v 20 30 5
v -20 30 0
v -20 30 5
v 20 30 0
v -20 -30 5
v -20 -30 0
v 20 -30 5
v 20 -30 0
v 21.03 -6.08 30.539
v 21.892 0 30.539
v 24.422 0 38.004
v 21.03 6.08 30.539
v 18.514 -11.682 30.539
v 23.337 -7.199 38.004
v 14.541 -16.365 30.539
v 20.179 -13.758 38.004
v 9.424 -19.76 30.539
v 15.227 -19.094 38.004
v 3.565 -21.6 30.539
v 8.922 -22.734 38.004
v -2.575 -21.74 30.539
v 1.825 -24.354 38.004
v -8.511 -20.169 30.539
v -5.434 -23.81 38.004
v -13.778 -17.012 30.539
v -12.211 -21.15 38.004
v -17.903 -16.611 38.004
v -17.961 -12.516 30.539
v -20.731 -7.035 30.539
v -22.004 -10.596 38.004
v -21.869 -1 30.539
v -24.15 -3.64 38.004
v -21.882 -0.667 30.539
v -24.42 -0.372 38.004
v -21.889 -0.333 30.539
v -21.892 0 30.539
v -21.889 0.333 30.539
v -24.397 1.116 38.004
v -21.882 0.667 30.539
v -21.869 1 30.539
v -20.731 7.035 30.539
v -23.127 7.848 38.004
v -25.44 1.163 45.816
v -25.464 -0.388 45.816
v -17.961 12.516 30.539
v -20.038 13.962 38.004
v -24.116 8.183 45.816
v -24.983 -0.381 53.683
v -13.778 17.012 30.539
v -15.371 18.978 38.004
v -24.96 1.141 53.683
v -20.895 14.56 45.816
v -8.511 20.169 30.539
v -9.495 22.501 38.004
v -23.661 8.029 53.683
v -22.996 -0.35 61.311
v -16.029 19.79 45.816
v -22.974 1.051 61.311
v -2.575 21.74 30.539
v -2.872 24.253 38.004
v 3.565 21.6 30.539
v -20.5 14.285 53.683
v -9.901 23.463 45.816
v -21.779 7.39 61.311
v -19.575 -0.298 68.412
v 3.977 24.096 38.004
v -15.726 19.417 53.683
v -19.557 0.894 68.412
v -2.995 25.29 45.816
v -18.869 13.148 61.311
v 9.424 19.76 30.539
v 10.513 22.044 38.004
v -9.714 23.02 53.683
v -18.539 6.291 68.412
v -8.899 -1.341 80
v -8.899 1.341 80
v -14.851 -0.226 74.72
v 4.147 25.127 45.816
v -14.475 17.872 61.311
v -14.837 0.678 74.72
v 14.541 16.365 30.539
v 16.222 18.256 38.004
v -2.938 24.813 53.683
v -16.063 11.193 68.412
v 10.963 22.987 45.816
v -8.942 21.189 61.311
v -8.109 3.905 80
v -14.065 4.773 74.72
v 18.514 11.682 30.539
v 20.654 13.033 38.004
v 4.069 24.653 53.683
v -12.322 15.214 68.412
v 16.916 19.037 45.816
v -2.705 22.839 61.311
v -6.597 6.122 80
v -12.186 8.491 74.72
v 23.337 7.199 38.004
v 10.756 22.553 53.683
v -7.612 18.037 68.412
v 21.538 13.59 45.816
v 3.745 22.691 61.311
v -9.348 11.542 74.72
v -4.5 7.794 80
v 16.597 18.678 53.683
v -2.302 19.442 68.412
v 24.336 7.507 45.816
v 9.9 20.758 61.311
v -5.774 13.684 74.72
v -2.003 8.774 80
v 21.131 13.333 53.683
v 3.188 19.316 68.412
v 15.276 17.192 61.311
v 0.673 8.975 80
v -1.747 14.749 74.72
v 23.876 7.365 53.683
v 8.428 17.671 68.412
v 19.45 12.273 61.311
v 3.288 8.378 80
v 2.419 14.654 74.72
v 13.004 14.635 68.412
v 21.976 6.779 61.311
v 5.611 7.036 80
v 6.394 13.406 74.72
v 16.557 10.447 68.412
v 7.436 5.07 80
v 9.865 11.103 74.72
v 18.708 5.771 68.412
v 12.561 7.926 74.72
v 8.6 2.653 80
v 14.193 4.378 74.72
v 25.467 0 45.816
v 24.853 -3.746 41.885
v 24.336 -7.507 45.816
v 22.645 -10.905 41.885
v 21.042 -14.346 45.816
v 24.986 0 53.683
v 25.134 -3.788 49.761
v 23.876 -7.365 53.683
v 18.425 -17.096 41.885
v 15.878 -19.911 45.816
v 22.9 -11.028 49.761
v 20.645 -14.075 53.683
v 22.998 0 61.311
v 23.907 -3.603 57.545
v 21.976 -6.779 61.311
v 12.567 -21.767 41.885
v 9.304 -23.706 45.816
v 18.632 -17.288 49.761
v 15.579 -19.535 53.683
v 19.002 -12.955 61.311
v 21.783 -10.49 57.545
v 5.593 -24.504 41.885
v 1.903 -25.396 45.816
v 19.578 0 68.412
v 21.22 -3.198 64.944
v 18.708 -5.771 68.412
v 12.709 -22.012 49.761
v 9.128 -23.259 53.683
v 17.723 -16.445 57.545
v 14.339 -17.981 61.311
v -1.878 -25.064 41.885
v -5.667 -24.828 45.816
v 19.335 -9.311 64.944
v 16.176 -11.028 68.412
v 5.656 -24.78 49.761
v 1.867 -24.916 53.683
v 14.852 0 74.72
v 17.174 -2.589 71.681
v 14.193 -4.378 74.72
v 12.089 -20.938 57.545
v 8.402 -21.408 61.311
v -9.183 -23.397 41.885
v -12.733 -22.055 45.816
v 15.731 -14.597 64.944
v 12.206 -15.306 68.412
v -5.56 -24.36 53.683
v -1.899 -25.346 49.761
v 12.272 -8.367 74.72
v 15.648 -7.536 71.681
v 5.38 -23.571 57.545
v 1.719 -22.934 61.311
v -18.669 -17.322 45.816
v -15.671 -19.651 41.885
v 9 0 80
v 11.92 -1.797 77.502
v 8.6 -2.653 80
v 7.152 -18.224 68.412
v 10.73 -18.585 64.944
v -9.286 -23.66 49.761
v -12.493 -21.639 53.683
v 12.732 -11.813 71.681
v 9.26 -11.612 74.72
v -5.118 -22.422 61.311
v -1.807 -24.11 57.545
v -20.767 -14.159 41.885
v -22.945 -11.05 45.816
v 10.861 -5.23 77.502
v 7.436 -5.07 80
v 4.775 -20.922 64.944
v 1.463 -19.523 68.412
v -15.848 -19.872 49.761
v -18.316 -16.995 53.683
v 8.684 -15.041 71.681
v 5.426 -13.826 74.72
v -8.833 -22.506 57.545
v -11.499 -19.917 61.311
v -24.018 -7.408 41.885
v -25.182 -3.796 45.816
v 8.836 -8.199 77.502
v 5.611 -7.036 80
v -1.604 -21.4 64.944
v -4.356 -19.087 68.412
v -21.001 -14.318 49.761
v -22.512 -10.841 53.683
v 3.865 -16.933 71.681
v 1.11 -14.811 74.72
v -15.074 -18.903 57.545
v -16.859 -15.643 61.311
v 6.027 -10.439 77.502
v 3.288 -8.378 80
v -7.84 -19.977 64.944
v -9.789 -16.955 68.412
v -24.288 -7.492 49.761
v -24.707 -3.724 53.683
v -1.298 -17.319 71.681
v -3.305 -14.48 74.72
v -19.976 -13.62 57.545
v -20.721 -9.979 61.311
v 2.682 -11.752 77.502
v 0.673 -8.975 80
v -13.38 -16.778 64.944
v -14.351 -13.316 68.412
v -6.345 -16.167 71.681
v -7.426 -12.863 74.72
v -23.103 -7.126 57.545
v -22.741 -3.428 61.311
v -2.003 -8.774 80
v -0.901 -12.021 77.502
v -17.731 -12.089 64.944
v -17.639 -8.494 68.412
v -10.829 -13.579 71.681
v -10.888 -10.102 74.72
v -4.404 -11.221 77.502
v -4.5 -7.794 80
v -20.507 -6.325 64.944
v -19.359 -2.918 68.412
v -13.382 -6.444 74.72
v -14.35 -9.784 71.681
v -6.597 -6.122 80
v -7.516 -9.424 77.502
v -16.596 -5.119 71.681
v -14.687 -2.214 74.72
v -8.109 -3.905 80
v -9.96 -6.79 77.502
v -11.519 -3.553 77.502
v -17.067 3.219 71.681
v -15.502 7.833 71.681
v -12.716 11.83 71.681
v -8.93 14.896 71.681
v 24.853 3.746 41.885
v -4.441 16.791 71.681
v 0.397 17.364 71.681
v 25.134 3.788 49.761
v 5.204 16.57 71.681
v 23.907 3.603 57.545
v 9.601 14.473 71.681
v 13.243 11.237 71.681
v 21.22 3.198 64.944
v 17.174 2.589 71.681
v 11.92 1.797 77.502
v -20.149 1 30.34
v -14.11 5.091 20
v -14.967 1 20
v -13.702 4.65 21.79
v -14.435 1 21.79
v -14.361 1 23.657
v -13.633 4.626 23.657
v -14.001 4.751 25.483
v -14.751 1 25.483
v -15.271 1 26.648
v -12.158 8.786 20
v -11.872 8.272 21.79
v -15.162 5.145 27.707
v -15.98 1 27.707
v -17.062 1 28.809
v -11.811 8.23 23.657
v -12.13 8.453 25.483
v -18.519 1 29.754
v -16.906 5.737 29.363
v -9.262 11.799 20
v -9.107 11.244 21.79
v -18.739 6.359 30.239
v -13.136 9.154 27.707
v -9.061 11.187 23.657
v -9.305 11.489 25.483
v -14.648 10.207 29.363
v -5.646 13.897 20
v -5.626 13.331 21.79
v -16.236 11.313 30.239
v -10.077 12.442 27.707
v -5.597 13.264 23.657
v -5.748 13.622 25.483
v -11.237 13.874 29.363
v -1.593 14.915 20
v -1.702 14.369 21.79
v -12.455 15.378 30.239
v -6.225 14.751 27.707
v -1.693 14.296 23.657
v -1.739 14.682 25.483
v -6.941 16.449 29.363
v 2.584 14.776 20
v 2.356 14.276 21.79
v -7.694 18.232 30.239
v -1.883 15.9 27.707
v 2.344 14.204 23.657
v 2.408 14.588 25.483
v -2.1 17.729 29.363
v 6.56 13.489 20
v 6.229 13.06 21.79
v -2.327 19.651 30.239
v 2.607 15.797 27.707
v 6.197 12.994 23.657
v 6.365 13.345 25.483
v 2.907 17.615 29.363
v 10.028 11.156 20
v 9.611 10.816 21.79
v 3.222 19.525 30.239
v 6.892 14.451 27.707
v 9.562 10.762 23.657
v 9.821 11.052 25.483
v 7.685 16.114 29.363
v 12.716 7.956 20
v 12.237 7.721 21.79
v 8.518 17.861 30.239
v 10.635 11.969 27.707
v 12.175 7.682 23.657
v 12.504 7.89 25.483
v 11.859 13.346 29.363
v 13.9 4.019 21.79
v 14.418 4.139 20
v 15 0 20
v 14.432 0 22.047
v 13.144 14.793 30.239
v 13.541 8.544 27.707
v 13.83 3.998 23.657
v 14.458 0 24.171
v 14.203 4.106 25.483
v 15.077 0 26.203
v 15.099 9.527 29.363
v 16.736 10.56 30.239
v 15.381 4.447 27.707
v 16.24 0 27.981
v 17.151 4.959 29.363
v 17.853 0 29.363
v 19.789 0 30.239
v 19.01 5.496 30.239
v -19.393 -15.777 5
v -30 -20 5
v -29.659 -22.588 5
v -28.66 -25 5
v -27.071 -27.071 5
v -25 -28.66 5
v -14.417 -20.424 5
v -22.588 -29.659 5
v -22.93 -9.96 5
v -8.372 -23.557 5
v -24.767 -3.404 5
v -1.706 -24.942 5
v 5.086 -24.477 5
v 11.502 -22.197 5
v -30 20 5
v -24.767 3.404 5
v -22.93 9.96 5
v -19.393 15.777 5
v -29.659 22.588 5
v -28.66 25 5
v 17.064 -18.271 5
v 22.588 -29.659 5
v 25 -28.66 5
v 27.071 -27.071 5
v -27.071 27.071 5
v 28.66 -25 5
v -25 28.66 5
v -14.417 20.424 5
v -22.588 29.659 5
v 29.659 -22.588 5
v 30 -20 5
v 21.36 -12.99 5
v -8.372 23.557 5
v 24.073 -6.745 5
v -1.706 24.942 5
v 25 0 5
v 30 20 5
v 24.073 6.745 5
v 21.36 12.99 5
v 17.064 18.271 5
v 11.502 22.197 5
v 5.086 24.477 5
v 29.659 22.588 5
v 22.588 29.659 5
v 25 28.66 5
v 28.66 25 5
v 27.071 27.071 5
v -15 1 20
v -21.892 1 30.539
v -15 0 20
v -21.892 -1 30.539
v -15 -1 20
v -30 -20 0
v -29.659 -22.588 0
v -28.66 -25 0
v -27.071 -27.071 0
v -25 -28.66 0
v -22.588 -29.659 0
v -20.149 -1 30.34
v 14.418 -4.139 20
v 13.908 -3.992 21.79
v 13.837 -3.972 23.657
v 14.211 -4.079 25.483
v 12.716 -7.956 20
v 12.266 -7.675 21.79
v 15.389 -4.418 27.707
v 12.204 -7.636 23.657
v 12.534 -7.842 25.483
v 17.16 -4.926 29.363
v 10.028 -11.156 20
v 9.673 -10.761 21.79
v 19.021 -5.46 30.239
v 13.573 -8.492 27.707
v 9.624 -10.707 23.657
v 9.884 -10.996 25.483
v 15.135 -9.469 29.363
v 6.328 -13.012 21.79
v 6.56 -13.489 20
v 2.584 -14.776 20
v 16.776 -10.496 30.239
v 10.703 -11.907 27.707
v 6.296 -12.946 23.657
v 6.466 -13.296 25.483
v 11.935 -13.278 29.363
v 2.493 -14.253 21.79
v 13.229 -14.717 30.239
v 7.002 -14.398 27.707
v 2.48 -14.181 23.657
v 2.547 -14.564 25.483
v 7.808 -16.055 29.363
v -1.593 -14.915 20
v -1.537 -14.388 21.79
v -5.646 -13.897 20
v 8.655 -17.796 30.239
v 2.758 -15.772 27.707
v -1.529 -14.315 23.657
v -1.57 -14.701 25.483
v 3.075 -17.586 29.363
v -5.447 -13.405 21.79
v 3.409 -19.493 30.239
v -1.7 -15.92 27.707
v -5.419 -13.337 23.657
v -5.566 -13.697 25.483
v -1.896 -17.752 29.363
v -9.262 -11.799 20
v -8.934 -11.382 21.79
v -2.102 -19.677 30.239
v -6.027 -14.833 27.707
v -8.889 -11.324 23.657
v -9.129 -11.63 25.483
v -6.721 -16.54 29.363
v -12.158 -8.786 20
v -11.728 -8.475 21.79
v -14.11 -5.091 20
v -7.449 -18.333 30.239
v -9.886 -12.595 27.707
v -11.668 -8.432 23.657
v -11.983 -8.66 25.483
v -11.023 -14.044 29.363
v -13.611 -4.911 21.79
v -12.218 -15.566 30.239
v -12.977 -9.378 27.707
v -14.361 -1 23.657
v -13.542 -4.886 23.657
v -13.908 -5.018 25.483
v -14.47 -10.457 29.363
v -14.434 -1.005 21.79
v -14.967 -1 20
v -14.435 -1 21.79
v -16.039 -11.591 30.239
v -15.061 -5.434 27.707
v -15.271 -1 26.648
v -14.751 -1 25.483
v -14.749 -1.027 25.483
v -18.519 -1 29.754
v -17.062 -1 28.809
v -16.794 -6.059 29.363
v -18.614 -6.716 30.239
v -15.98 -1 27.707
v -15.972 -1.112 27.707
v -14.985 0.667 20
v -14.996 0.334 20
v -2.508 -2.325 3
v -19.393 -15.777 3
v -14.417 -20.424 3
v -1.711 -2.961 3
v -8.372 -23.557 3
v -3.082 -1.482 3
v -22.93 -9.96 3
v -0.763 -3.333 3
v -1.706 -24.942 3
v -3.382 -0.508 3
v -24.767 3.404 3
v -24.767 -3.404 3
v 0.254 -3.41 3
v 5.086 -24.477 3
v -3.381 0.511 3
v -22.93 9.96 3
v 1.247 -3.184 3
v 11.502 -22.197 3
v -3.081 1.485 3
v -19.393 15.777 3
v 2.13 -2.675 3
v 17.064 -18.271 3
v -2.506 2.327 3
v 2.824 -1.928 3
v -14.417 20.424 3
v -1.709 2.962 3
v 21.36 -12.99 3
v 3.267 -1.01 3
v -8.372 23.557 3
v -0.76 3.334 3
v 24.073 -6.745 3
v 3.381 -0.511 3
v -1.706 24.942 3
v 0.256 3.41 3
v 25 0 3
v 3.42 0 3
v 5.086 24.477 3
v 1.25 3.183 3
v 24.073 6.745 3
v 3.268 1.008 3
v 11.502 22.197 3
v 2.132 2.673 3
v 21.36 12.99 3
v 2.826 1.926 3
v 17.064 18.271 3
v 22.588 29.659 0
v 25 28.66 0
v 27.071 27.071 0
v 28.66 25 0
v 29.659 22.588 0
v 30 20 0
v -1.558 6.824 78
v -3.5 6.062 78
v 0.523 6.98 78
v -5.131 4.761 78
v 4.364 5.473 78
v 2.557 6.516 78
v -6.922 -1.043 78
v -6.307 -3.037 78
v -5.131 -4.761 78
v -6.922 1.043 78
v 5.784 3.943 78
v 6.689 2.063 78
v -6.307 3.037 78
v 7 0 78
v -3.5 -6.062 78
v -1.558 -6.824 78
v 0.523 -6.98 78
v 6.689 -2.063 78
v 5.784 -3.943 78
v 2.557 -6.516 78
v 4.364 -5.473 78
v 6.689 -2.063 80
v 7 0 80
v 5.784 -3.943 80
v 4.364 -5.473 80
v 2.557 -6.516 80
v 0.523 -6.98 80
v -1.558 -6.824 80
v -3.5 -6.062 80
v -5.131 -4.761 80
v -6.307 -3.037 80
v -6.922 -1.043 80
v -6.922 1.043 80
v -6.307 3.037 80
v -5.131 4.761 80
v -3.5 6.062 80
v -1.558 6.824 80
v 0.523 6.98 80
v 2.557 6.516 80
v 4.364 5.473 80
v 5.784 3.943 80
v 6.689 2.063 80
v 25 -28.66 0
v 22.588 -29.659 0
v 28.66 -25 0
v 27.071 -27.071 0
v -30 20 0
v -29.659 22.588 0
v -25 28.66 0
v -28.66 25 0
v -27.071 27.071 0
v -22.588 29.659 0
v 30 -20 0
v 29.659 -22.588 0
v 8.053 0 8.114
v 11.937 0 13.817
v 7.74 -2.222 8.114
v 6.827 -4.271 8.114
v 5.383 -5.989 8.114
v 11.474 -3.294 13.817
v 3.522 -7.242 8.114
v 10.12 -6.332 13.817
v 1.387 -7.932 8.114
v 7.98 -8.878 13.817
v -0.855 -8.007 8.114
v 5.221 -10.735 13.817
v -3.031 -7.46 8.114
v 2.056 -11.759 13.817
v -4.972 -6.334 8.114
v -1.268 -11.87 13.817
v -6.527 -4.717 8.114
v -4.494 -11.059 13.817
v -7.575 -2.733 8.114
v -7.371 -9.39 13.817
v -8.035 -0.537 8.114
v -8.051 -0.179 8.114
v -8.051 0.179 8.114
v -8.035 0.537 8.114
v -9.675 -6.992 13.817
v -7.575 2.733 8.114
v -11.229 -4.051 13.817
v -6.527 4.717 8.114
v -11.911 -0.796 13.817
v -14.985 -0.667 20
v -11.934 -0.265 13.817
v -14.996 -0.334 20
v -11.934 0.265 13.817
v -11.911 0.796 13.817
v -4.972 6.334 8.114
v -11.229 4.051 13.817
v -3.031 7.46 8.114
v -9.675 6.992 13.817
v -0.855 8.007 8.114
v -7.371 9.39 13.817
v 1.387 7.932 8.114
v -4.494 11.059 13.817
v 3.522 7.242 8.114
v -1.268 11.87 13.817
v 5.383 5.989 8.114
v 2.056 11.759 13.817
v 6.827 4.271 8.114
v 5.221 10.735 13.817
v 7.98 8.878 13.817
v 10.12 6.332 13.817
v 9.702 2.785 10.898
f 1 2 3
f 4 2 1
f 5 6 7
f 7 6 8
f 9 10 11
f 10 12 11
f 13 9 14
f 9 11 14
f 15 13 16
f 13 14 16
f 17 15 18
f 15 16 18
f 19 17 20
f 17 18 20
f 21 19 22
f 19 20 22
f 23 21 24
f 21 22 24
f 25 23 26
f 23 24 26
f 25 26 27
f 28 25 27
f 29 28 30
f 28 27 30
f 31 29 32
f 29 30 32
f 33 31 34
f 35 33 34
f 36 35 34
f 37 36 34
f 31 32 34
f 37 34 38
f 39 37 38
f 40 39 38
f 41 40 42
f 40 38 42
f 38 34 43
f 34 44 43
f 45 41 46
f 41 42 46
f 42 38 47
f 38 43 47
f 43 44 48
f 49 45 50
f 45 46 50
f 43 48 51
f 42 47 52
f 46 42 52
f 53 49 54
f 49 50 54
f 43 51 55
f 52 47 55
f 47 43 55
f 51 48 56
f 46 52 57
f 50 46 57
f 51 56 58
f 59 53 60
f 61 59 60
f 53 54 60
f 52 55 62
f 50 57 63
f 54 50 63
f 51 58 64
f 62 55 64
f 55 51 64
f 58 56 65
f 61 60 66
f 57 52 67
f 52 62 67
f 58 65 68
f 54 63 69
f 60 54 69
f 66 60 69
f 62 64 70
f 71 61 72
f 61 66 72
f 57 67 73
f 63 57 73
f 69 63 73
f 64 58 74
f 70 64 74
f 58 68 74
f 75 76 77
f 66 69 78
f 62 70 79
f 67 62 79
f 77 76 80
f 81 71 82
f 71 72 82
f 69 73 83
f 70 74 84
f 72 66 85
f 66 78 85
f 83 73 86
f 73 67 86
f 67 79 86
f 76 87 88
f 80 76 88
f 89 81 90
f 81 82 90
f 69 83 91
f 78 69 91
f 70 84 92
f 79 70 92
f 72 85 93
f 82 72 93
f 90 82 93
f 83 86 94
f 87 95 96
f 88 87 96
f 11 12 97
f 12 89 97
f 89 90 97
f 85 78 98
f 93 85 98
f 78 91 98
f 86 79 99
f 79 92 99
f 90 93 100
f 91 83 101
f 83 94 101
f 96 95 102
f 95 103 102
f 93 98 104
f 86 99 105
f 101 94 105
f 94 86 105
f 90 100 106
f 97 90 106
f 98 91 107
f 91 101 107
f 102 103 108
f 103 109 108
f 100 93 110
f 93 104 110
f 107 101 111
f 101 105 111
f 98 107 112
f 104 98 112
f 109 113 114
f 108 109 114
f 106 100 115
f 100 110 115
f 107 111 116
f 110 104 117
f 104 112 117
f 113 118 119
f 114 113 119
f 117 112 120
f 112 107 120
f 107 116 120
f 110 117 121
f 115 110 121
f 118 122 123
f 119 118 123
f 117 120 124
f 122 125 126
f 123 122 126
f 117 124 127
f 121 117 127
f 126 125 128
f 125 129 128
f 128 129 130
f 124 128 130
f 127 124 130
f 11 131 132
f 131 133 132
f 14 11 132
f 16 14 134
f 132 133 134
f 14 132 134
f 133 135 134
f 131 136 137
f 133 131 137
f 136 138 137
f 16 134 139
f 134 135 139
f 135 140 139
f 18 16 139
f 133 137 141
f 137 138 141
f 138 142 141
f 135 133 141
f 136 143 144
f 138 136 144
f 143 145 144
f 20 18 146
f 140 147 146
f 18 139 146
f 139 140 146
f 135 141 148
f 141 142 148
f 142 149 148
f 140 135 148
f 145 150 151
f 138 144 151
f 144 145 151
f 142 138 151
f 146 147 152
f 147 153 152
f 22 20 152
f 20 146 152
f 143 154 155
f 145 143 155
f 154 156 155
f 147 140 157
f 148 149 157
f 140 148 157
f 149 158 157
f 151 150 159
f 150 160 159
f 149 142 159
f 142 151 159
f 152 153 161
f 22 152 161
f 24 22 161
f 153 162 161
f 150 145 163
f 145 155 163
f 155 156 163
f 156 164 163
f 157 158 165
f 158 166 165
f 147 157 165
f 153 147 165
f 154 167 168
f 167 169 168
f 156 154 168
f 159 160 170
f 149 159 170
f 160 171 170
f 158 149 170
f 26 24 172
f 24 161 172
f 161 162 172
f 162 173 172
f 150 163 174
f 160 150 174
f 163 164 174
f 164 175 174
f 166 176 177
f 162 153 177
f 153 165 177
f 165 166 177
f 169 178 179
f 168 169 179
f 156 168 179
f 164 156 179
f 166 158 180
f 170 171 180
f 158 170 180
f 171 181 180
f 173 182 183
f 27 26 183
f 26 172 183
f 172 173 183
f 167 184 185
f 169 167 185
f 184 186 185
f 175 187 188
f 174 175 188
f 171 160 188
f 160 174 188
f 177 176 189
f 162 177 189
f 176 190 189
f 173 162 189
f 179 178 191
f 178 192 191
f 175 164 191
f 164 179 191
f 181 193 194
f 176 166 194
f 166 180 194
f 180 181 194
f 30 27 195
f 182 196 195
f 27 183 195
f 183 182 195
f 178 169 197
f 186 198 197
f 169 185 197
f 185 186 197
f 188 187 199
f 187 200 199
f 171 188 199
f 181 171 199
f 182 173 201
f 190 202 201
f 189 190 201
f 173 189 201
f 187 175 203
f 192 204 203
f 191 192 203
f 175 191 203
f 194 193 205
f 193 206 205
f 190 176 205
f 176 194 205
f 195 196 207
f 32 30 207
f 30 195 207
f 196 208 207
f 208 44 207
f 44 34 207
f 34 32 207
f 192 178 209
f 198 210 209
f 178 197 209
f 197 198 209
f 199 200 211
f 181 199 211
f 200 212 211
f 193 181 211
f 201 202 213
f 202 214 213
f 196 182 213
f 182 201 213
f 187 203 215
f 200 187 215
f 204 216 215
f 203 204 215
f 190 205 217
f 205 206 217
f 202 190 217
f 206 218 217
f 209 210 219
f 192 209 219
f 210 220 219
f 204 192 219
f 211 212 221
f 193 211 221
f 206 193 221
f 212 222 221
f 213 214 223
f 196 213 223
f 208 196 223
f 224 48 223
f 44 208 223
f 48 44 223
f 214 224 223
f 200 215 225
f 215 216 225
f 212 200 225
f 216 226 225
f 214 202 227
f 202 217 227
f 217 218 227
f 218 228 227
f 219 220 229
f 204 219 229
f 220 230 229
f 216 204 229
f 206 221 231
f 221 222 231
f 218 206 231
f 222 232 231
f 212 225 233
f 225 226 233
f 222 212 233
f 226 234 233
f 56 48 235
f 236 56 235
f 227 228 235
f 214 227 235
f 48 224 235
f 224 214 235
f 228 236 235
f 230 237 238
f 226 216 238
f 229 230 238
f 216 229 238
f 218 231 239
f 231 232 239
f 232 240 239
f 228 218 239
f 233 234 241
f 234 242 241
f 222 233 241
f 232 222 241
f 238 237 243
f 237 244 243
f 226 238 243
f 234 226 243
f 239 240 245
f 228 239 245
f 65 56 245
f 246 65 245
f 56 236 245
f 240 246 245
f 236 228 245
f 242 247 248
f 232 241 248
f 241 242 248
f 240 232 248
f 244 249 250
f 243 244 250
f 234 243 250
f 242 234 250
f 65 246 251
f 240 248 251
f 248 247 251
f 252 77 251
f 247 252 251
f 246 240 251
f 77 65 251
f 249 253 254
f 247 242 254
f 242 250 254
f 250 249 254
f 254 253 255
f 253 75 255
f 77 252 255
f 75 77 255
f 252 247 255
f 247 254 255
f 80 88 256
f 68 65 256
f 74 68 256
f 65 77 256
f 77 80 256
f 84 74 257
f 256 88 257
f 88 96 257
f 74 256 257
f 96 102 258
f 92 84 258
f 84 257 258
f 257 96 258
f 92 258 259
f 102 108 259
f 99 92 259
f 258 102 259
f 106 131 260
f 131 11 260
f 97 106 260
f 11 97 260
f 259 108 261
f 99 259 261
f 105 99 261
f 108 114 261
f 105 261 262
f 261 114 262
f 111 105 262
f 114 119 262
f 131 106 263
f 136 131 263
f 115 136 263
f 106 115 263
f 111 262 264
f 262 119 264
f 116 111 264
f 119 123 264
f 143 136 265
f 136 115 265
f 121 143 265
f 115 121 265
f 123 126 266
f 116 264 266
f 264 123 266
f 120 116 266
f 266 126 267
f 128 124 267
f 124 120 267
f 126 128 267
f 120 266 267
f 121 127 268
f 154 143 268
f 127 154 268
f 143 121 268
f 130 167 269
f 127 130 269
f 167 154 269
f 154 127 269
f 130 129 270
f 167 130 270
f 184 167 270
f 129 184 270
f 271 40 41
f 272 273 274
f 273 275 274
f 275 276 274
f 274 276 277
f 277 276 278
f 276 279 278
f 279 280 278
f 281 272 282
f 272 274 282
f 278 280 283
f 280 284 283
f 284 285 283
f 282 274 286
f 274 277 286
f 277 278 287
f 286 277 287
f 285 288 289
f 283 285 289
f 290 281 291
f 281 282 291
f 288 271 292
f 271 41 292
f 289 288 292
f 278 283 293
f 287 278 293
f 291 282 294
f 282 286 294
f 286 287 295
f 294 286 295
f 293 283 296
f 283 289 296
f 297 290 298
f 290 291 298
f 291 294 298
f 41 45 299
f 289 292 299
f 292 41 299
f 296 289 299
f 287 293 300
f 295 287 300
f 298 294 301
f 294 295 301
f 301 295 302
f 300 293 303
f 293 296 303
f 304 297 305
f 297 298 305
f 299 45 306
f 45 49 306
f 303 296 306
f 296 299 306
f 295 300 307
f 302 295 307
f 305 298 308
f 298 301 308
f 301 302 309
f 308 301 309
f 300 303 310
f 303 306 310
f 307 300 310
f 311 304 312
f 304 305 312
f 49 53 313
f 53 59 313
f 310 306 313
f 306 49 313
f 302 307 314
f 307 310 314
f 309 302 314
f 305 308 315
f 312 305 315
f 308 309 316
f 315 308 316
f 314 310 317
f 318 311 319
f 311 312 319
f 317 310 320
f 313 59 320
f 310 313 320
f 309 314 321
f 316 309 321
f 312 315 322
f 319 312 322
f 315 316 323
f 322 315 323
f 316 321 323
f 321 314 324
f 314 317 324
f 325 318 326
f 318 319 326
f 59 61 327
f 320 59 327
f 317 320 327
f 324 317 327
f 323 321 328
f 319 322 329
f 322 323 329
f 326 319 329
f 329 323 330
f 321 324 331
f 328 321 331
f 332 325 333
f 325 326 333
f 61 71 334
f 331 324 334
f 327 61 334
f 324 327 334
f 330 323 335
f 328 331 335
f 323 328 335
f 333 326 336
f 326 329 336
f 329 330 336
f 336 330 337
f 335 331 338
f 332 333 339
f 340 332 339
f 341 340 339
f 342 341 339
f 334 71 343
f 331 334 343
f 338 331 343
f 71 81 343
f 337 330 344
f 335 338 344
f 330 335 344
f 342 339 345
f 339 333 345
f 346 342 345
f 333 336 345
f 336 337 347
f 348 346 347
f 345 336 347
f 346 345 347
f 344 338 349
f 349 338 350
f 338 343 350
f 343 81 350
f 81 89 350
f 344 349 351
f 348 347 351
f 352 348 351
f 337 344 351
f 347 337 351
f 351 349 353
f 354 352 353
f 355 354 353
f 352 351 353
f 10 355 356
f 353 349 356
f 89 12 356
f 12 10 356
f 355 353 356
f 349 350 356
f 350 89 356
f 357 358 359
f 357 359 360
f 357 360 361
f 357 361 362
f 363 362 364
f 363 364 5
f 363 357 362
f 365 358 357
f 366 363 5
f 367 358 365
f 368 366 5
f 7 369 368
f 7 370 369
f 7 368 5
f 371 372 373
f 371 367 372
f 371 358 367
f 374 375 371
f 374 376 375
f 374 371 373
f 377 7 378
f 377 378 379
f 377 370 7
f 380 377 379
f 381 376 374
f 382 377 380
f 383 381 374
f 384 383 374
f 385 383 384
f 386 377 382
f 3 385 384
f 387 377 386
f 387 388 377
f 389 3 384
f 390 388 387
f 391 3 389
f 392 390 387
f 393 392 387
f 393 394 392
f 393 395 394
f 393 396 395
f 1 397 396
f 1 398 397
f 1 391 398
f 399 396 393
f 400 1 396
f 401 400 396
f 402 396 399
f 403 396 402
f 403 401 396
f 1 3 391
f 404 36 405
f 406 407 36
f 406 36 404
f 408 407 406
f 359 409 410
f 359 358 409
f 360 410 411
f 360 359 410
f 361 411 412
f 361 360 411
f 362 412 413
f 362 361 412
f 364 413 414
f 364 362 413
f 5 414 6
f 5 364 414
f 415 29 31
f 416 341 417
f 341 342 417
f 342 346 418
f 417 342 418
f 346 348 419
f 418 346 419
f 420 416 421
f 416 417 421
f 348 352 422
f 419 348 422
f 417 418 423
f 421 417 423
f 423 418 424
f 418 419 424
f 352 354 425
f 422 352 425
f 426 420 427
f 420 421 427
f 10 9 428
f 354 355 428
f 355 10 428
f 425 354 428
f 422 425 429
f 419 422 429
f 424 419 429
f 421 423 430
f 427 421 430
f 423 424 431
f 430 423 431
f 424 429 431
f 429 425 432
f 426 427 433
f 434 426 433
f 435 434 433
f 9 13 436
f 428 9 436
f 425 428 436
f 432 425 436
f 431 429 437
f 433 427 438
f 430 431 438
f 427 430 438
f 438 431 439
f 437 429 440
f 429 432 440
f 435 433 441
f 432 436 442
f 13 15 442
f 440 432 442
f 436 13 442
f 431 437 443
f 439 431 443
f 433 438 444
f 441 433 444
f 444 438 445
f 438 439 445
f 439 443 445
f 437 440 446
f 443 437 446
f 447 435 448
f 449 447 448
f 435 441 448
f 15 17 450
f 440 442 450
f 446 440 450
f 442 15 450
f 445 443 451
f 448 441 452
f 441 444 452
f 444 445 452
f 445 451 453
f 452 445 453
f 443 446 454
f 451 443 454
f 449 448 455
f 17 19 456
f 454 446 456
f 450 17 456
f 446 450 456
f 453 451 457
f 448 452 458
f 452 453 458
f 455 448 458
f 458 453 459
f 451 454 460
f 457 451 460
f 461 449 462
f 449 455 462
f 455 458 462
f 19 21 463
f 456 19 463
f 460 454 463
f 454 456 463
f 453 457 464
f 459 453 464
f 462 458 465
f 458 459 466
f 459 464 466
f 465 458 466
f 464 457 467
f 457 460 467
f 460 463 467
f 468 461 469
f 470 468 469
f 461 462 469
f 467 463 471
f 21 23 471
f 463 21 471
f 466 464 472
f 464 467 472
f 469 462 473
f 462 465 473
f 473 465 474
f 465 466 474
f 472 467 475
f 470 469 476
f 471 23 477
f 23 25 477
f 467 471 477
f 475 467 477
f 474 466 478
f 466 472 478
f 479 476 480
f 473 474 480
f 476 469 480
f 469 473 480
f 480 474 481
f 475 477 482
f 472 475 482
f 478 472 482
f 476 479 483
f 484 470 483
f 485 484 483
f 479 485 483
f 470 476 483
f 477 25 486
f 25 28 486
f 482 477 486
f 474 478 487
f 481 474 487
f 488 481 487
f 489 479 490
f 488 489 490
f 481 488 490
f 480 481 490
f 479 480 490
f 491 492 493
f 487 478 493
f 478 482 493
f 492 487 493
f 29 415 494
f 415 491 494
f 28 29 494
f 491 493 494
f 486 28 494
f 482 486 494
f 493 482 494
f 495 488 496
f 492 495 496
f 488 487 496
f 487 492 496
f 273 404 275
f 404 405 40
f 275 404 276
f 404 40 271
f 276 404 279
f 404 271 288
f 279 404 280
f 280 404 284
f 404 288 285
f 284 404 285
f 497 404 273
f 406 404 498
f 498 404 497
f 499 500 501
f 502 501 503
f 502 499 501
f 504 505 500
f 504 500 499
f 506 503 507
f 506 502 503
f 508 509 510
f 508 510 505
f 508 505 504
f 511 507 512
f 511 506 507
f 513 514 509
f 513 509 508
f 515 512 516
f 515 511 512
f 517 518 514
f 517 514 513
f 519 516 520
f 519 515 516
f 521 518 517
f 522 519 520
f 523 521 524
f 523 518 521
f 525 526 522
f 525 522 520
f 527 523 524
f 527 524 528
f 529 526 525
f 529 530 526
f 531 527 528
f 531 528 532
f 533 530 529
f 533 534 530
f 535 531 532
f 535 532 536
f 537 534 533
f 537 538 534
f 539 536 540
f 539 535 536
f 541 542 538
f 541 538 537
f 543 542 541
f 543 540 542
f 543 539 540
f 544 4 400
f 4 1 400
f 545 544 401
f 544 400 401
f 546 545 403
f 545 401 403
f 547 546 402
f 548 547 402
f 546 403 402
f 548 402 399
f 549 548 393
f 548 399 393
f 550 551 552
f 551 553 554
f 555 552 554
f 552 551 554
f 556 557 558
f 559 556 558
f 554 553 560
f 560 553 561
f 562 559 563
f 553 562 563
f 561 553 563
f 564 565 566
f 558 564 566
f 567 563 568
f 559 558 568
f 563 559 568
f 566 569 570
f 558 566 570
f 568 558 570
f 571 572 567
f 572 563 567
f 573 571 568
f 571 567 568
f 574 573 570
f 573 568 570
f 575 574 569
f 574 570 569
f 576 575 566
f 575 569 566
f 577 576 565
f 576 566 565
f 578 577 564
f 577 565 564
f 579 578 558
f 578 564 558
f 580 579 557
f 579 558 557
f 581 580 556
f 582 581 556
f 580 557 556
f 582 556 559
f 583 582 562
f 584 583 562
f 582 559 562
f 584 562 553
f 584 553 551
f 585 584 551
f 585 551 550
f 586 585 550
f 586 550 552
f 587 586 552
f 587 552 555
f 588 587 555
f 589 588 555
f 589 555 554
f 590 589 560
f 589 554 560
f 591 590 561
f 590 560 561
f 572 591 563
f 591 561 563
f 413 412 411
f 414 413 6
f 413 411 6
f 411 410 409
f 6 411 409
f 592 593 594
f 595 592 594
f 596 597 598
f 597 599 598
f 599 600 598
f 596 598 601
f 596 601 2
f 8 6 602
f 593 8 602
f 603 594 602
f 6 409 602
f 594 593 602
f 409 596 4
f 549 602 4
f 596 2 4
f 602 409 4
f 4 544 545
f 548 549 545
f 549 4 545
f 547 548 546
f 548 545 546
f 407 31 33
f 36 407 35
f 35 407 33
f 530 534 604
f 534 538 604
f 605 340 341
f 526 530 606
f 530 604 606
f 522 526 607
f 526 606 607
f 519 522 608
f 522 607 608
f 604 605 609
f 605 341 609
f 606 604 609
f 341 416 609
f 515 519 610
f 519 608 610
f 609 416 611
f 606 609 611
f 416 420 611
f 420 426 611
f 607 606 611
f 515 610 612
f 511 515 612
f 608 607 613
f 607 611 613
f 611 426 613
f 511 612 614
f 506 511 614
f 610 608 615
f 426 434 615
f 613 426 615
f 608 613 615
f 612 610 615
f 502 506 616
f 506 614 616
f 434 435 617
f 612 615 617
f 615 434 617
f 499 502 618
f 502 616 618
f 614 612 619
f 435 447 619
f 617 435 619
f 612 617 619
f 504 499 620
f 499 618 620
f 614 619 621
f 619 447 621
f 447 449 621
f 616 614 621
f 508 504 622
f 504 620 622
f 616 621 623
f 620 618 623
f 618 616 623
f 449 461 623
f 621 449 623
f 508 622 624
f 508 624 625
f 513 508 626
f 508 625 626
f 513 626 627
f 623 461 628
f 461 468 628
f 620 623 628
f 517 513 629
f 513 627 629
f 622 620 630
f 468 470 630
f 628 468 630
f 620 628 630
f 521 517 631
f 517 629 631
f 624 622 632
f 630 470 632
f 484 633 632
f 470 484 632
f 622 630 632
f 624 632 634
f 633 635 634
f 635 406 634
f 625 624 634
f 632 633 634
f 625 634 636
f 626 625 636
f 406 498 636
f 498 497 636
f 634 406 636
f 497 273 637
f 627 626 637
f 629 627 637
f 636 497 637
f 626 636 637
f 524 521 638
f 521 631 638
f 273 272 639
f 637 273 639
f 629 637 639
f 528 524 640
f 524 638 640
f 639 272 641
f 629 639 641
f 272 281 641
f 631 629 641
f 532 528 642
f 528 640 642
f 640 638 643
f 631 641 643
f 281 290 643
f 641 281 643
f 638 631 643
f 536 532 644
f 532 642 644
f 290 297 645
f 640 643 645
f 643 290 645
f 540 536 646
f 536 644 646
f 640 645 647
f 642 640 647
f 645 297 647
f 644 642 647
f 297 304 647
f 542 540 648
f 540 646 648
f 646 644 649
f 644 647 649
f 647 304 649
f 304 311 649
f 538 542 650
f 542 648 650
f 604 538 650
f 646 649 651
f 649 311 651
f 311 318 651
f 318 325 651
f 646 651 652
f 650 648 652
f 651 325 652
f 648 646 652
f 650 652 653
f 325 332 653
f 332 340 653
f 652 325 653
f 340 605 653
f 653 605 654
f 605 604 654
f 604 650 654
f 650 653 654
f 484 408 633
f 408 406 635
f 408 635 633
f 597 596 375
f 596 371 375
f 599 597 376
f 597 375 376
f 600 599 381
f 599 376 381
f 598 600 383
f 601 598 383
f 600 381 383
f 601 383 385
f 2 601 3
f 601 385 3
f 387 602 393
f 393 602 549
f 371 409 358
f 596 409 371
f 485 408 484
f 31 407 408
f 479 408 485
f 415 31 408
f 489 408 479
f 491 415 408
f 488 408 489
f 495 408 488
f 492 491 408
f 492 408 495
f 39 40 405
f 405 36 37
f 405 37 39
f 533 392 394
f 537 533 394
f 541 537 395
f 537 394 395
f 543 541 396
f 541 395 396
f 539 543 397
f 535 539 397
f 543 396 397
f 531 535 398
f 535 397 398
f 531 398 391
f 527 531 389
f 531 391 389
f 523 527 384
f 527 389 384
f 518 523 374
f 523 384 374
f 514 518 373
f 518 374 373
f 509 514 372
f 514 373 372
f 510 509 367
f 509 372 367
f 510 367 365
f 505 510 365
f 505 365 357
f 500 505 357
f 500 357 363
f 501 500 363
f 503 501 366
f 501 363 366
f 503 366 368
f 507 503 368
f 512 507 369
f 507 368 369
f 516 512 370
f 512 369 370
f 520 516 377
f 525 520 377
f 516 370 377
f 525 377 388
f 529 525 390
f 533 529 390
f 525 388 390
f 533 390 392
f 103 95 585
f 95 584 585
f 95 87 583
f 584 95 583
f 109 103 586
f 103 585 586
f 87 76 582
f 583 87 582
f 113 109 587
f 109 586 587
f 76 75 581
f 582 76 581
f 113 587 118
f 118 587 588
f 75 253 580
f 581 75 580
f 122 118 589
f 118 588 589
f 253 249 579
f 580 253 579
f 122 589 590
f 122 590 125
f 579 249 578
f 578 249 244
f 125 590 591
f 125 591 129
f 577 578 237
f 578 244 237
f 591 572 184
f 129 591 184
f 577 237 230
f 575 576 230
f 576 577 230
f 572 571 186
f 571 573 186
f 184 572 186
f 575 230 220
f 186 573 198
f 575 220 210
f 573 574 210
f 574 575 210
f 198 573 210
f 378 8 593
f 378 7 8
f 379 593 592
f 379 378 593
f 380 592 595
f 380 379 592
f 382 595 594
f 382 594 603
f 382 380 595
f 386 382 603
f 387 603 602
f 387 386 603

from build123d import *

# Parameters (mm, degrees)
F0_W     = 60
F0_H     = 60
F1_DEPTH = 5
F2_R     = 25
F3_DEPTH = 2
F4_R     = 10
F8_DEPTH = 1


with BuildPart() as f1:
    # F0 (on Top) → F1 (new body)
    with BuildSketch(Plane.XY):
        Rectangle(F0_W, F0_H)
    extrude(amount=F1_DEPTH)

    # F2 (on face) → F3 (cut)
    with BuildSketch(Plane.XY.offset(5)):
        Circle(F2_R)
    extrude(amount=-F3_DEPTH, mode=Mode.SUBTRACT)

    # F4
    f4_edges = [f1.edges().sort_by_distance(p)[0] for p in [
        (30, 30, 2.5),
        (-30, 30, 2.5),
        (30, -30, 2.5),
        (-30, -30, 2.5),
    ]]
    fillet(f4_edges, radius=F4_R)

    # F5 (on Front) → F6 (revolve)
    with BuildSketch(Plane.XZ):
        with BuildLine():
            Line((15, 20), (0, 20))
            Line((0, 20), (0, 0))
            ThreePointArc((0, 0), (8.770167, 9.047375), (15, 20))
        make_face()
        with BuildLine():
            Line((21.891709, 30.538945), (0, 30.538945))
            Line((0, 30.538945), (0, 20))
            Line((0, 20), (15, 20))
            ThreePointArc((15, 20), (15.595579, 27.133347), (21.891709, 30.538945))
        make_face()
        with BuildLine():
            Line((7, 78), (0, 78))
            Line((0, 78), (0, 30.538945))
            Line((0, 30.538945), (21.891709, 30.538945))
            ThreePointArc((21.891709, 30.538945), (24.177264, 57.545259), (9, 80))
            Line((9, 80), (7, 80))
            Line((7, 80), (7, 78))
        make_face()
    revolve(axis=Axis((0, 0, 40), (0, 0, -1)))

    # F7 (on Front) → F8 (join, symmetric)
    with BuildSketch(Plane.XZ):
        Polygon((-21.891709, 30.538945), (-15, 20), (0, 20), (0, 30.538945), align=None)
    extrude(amount=F8_DEPTH, both=True)


solid = f1.part
